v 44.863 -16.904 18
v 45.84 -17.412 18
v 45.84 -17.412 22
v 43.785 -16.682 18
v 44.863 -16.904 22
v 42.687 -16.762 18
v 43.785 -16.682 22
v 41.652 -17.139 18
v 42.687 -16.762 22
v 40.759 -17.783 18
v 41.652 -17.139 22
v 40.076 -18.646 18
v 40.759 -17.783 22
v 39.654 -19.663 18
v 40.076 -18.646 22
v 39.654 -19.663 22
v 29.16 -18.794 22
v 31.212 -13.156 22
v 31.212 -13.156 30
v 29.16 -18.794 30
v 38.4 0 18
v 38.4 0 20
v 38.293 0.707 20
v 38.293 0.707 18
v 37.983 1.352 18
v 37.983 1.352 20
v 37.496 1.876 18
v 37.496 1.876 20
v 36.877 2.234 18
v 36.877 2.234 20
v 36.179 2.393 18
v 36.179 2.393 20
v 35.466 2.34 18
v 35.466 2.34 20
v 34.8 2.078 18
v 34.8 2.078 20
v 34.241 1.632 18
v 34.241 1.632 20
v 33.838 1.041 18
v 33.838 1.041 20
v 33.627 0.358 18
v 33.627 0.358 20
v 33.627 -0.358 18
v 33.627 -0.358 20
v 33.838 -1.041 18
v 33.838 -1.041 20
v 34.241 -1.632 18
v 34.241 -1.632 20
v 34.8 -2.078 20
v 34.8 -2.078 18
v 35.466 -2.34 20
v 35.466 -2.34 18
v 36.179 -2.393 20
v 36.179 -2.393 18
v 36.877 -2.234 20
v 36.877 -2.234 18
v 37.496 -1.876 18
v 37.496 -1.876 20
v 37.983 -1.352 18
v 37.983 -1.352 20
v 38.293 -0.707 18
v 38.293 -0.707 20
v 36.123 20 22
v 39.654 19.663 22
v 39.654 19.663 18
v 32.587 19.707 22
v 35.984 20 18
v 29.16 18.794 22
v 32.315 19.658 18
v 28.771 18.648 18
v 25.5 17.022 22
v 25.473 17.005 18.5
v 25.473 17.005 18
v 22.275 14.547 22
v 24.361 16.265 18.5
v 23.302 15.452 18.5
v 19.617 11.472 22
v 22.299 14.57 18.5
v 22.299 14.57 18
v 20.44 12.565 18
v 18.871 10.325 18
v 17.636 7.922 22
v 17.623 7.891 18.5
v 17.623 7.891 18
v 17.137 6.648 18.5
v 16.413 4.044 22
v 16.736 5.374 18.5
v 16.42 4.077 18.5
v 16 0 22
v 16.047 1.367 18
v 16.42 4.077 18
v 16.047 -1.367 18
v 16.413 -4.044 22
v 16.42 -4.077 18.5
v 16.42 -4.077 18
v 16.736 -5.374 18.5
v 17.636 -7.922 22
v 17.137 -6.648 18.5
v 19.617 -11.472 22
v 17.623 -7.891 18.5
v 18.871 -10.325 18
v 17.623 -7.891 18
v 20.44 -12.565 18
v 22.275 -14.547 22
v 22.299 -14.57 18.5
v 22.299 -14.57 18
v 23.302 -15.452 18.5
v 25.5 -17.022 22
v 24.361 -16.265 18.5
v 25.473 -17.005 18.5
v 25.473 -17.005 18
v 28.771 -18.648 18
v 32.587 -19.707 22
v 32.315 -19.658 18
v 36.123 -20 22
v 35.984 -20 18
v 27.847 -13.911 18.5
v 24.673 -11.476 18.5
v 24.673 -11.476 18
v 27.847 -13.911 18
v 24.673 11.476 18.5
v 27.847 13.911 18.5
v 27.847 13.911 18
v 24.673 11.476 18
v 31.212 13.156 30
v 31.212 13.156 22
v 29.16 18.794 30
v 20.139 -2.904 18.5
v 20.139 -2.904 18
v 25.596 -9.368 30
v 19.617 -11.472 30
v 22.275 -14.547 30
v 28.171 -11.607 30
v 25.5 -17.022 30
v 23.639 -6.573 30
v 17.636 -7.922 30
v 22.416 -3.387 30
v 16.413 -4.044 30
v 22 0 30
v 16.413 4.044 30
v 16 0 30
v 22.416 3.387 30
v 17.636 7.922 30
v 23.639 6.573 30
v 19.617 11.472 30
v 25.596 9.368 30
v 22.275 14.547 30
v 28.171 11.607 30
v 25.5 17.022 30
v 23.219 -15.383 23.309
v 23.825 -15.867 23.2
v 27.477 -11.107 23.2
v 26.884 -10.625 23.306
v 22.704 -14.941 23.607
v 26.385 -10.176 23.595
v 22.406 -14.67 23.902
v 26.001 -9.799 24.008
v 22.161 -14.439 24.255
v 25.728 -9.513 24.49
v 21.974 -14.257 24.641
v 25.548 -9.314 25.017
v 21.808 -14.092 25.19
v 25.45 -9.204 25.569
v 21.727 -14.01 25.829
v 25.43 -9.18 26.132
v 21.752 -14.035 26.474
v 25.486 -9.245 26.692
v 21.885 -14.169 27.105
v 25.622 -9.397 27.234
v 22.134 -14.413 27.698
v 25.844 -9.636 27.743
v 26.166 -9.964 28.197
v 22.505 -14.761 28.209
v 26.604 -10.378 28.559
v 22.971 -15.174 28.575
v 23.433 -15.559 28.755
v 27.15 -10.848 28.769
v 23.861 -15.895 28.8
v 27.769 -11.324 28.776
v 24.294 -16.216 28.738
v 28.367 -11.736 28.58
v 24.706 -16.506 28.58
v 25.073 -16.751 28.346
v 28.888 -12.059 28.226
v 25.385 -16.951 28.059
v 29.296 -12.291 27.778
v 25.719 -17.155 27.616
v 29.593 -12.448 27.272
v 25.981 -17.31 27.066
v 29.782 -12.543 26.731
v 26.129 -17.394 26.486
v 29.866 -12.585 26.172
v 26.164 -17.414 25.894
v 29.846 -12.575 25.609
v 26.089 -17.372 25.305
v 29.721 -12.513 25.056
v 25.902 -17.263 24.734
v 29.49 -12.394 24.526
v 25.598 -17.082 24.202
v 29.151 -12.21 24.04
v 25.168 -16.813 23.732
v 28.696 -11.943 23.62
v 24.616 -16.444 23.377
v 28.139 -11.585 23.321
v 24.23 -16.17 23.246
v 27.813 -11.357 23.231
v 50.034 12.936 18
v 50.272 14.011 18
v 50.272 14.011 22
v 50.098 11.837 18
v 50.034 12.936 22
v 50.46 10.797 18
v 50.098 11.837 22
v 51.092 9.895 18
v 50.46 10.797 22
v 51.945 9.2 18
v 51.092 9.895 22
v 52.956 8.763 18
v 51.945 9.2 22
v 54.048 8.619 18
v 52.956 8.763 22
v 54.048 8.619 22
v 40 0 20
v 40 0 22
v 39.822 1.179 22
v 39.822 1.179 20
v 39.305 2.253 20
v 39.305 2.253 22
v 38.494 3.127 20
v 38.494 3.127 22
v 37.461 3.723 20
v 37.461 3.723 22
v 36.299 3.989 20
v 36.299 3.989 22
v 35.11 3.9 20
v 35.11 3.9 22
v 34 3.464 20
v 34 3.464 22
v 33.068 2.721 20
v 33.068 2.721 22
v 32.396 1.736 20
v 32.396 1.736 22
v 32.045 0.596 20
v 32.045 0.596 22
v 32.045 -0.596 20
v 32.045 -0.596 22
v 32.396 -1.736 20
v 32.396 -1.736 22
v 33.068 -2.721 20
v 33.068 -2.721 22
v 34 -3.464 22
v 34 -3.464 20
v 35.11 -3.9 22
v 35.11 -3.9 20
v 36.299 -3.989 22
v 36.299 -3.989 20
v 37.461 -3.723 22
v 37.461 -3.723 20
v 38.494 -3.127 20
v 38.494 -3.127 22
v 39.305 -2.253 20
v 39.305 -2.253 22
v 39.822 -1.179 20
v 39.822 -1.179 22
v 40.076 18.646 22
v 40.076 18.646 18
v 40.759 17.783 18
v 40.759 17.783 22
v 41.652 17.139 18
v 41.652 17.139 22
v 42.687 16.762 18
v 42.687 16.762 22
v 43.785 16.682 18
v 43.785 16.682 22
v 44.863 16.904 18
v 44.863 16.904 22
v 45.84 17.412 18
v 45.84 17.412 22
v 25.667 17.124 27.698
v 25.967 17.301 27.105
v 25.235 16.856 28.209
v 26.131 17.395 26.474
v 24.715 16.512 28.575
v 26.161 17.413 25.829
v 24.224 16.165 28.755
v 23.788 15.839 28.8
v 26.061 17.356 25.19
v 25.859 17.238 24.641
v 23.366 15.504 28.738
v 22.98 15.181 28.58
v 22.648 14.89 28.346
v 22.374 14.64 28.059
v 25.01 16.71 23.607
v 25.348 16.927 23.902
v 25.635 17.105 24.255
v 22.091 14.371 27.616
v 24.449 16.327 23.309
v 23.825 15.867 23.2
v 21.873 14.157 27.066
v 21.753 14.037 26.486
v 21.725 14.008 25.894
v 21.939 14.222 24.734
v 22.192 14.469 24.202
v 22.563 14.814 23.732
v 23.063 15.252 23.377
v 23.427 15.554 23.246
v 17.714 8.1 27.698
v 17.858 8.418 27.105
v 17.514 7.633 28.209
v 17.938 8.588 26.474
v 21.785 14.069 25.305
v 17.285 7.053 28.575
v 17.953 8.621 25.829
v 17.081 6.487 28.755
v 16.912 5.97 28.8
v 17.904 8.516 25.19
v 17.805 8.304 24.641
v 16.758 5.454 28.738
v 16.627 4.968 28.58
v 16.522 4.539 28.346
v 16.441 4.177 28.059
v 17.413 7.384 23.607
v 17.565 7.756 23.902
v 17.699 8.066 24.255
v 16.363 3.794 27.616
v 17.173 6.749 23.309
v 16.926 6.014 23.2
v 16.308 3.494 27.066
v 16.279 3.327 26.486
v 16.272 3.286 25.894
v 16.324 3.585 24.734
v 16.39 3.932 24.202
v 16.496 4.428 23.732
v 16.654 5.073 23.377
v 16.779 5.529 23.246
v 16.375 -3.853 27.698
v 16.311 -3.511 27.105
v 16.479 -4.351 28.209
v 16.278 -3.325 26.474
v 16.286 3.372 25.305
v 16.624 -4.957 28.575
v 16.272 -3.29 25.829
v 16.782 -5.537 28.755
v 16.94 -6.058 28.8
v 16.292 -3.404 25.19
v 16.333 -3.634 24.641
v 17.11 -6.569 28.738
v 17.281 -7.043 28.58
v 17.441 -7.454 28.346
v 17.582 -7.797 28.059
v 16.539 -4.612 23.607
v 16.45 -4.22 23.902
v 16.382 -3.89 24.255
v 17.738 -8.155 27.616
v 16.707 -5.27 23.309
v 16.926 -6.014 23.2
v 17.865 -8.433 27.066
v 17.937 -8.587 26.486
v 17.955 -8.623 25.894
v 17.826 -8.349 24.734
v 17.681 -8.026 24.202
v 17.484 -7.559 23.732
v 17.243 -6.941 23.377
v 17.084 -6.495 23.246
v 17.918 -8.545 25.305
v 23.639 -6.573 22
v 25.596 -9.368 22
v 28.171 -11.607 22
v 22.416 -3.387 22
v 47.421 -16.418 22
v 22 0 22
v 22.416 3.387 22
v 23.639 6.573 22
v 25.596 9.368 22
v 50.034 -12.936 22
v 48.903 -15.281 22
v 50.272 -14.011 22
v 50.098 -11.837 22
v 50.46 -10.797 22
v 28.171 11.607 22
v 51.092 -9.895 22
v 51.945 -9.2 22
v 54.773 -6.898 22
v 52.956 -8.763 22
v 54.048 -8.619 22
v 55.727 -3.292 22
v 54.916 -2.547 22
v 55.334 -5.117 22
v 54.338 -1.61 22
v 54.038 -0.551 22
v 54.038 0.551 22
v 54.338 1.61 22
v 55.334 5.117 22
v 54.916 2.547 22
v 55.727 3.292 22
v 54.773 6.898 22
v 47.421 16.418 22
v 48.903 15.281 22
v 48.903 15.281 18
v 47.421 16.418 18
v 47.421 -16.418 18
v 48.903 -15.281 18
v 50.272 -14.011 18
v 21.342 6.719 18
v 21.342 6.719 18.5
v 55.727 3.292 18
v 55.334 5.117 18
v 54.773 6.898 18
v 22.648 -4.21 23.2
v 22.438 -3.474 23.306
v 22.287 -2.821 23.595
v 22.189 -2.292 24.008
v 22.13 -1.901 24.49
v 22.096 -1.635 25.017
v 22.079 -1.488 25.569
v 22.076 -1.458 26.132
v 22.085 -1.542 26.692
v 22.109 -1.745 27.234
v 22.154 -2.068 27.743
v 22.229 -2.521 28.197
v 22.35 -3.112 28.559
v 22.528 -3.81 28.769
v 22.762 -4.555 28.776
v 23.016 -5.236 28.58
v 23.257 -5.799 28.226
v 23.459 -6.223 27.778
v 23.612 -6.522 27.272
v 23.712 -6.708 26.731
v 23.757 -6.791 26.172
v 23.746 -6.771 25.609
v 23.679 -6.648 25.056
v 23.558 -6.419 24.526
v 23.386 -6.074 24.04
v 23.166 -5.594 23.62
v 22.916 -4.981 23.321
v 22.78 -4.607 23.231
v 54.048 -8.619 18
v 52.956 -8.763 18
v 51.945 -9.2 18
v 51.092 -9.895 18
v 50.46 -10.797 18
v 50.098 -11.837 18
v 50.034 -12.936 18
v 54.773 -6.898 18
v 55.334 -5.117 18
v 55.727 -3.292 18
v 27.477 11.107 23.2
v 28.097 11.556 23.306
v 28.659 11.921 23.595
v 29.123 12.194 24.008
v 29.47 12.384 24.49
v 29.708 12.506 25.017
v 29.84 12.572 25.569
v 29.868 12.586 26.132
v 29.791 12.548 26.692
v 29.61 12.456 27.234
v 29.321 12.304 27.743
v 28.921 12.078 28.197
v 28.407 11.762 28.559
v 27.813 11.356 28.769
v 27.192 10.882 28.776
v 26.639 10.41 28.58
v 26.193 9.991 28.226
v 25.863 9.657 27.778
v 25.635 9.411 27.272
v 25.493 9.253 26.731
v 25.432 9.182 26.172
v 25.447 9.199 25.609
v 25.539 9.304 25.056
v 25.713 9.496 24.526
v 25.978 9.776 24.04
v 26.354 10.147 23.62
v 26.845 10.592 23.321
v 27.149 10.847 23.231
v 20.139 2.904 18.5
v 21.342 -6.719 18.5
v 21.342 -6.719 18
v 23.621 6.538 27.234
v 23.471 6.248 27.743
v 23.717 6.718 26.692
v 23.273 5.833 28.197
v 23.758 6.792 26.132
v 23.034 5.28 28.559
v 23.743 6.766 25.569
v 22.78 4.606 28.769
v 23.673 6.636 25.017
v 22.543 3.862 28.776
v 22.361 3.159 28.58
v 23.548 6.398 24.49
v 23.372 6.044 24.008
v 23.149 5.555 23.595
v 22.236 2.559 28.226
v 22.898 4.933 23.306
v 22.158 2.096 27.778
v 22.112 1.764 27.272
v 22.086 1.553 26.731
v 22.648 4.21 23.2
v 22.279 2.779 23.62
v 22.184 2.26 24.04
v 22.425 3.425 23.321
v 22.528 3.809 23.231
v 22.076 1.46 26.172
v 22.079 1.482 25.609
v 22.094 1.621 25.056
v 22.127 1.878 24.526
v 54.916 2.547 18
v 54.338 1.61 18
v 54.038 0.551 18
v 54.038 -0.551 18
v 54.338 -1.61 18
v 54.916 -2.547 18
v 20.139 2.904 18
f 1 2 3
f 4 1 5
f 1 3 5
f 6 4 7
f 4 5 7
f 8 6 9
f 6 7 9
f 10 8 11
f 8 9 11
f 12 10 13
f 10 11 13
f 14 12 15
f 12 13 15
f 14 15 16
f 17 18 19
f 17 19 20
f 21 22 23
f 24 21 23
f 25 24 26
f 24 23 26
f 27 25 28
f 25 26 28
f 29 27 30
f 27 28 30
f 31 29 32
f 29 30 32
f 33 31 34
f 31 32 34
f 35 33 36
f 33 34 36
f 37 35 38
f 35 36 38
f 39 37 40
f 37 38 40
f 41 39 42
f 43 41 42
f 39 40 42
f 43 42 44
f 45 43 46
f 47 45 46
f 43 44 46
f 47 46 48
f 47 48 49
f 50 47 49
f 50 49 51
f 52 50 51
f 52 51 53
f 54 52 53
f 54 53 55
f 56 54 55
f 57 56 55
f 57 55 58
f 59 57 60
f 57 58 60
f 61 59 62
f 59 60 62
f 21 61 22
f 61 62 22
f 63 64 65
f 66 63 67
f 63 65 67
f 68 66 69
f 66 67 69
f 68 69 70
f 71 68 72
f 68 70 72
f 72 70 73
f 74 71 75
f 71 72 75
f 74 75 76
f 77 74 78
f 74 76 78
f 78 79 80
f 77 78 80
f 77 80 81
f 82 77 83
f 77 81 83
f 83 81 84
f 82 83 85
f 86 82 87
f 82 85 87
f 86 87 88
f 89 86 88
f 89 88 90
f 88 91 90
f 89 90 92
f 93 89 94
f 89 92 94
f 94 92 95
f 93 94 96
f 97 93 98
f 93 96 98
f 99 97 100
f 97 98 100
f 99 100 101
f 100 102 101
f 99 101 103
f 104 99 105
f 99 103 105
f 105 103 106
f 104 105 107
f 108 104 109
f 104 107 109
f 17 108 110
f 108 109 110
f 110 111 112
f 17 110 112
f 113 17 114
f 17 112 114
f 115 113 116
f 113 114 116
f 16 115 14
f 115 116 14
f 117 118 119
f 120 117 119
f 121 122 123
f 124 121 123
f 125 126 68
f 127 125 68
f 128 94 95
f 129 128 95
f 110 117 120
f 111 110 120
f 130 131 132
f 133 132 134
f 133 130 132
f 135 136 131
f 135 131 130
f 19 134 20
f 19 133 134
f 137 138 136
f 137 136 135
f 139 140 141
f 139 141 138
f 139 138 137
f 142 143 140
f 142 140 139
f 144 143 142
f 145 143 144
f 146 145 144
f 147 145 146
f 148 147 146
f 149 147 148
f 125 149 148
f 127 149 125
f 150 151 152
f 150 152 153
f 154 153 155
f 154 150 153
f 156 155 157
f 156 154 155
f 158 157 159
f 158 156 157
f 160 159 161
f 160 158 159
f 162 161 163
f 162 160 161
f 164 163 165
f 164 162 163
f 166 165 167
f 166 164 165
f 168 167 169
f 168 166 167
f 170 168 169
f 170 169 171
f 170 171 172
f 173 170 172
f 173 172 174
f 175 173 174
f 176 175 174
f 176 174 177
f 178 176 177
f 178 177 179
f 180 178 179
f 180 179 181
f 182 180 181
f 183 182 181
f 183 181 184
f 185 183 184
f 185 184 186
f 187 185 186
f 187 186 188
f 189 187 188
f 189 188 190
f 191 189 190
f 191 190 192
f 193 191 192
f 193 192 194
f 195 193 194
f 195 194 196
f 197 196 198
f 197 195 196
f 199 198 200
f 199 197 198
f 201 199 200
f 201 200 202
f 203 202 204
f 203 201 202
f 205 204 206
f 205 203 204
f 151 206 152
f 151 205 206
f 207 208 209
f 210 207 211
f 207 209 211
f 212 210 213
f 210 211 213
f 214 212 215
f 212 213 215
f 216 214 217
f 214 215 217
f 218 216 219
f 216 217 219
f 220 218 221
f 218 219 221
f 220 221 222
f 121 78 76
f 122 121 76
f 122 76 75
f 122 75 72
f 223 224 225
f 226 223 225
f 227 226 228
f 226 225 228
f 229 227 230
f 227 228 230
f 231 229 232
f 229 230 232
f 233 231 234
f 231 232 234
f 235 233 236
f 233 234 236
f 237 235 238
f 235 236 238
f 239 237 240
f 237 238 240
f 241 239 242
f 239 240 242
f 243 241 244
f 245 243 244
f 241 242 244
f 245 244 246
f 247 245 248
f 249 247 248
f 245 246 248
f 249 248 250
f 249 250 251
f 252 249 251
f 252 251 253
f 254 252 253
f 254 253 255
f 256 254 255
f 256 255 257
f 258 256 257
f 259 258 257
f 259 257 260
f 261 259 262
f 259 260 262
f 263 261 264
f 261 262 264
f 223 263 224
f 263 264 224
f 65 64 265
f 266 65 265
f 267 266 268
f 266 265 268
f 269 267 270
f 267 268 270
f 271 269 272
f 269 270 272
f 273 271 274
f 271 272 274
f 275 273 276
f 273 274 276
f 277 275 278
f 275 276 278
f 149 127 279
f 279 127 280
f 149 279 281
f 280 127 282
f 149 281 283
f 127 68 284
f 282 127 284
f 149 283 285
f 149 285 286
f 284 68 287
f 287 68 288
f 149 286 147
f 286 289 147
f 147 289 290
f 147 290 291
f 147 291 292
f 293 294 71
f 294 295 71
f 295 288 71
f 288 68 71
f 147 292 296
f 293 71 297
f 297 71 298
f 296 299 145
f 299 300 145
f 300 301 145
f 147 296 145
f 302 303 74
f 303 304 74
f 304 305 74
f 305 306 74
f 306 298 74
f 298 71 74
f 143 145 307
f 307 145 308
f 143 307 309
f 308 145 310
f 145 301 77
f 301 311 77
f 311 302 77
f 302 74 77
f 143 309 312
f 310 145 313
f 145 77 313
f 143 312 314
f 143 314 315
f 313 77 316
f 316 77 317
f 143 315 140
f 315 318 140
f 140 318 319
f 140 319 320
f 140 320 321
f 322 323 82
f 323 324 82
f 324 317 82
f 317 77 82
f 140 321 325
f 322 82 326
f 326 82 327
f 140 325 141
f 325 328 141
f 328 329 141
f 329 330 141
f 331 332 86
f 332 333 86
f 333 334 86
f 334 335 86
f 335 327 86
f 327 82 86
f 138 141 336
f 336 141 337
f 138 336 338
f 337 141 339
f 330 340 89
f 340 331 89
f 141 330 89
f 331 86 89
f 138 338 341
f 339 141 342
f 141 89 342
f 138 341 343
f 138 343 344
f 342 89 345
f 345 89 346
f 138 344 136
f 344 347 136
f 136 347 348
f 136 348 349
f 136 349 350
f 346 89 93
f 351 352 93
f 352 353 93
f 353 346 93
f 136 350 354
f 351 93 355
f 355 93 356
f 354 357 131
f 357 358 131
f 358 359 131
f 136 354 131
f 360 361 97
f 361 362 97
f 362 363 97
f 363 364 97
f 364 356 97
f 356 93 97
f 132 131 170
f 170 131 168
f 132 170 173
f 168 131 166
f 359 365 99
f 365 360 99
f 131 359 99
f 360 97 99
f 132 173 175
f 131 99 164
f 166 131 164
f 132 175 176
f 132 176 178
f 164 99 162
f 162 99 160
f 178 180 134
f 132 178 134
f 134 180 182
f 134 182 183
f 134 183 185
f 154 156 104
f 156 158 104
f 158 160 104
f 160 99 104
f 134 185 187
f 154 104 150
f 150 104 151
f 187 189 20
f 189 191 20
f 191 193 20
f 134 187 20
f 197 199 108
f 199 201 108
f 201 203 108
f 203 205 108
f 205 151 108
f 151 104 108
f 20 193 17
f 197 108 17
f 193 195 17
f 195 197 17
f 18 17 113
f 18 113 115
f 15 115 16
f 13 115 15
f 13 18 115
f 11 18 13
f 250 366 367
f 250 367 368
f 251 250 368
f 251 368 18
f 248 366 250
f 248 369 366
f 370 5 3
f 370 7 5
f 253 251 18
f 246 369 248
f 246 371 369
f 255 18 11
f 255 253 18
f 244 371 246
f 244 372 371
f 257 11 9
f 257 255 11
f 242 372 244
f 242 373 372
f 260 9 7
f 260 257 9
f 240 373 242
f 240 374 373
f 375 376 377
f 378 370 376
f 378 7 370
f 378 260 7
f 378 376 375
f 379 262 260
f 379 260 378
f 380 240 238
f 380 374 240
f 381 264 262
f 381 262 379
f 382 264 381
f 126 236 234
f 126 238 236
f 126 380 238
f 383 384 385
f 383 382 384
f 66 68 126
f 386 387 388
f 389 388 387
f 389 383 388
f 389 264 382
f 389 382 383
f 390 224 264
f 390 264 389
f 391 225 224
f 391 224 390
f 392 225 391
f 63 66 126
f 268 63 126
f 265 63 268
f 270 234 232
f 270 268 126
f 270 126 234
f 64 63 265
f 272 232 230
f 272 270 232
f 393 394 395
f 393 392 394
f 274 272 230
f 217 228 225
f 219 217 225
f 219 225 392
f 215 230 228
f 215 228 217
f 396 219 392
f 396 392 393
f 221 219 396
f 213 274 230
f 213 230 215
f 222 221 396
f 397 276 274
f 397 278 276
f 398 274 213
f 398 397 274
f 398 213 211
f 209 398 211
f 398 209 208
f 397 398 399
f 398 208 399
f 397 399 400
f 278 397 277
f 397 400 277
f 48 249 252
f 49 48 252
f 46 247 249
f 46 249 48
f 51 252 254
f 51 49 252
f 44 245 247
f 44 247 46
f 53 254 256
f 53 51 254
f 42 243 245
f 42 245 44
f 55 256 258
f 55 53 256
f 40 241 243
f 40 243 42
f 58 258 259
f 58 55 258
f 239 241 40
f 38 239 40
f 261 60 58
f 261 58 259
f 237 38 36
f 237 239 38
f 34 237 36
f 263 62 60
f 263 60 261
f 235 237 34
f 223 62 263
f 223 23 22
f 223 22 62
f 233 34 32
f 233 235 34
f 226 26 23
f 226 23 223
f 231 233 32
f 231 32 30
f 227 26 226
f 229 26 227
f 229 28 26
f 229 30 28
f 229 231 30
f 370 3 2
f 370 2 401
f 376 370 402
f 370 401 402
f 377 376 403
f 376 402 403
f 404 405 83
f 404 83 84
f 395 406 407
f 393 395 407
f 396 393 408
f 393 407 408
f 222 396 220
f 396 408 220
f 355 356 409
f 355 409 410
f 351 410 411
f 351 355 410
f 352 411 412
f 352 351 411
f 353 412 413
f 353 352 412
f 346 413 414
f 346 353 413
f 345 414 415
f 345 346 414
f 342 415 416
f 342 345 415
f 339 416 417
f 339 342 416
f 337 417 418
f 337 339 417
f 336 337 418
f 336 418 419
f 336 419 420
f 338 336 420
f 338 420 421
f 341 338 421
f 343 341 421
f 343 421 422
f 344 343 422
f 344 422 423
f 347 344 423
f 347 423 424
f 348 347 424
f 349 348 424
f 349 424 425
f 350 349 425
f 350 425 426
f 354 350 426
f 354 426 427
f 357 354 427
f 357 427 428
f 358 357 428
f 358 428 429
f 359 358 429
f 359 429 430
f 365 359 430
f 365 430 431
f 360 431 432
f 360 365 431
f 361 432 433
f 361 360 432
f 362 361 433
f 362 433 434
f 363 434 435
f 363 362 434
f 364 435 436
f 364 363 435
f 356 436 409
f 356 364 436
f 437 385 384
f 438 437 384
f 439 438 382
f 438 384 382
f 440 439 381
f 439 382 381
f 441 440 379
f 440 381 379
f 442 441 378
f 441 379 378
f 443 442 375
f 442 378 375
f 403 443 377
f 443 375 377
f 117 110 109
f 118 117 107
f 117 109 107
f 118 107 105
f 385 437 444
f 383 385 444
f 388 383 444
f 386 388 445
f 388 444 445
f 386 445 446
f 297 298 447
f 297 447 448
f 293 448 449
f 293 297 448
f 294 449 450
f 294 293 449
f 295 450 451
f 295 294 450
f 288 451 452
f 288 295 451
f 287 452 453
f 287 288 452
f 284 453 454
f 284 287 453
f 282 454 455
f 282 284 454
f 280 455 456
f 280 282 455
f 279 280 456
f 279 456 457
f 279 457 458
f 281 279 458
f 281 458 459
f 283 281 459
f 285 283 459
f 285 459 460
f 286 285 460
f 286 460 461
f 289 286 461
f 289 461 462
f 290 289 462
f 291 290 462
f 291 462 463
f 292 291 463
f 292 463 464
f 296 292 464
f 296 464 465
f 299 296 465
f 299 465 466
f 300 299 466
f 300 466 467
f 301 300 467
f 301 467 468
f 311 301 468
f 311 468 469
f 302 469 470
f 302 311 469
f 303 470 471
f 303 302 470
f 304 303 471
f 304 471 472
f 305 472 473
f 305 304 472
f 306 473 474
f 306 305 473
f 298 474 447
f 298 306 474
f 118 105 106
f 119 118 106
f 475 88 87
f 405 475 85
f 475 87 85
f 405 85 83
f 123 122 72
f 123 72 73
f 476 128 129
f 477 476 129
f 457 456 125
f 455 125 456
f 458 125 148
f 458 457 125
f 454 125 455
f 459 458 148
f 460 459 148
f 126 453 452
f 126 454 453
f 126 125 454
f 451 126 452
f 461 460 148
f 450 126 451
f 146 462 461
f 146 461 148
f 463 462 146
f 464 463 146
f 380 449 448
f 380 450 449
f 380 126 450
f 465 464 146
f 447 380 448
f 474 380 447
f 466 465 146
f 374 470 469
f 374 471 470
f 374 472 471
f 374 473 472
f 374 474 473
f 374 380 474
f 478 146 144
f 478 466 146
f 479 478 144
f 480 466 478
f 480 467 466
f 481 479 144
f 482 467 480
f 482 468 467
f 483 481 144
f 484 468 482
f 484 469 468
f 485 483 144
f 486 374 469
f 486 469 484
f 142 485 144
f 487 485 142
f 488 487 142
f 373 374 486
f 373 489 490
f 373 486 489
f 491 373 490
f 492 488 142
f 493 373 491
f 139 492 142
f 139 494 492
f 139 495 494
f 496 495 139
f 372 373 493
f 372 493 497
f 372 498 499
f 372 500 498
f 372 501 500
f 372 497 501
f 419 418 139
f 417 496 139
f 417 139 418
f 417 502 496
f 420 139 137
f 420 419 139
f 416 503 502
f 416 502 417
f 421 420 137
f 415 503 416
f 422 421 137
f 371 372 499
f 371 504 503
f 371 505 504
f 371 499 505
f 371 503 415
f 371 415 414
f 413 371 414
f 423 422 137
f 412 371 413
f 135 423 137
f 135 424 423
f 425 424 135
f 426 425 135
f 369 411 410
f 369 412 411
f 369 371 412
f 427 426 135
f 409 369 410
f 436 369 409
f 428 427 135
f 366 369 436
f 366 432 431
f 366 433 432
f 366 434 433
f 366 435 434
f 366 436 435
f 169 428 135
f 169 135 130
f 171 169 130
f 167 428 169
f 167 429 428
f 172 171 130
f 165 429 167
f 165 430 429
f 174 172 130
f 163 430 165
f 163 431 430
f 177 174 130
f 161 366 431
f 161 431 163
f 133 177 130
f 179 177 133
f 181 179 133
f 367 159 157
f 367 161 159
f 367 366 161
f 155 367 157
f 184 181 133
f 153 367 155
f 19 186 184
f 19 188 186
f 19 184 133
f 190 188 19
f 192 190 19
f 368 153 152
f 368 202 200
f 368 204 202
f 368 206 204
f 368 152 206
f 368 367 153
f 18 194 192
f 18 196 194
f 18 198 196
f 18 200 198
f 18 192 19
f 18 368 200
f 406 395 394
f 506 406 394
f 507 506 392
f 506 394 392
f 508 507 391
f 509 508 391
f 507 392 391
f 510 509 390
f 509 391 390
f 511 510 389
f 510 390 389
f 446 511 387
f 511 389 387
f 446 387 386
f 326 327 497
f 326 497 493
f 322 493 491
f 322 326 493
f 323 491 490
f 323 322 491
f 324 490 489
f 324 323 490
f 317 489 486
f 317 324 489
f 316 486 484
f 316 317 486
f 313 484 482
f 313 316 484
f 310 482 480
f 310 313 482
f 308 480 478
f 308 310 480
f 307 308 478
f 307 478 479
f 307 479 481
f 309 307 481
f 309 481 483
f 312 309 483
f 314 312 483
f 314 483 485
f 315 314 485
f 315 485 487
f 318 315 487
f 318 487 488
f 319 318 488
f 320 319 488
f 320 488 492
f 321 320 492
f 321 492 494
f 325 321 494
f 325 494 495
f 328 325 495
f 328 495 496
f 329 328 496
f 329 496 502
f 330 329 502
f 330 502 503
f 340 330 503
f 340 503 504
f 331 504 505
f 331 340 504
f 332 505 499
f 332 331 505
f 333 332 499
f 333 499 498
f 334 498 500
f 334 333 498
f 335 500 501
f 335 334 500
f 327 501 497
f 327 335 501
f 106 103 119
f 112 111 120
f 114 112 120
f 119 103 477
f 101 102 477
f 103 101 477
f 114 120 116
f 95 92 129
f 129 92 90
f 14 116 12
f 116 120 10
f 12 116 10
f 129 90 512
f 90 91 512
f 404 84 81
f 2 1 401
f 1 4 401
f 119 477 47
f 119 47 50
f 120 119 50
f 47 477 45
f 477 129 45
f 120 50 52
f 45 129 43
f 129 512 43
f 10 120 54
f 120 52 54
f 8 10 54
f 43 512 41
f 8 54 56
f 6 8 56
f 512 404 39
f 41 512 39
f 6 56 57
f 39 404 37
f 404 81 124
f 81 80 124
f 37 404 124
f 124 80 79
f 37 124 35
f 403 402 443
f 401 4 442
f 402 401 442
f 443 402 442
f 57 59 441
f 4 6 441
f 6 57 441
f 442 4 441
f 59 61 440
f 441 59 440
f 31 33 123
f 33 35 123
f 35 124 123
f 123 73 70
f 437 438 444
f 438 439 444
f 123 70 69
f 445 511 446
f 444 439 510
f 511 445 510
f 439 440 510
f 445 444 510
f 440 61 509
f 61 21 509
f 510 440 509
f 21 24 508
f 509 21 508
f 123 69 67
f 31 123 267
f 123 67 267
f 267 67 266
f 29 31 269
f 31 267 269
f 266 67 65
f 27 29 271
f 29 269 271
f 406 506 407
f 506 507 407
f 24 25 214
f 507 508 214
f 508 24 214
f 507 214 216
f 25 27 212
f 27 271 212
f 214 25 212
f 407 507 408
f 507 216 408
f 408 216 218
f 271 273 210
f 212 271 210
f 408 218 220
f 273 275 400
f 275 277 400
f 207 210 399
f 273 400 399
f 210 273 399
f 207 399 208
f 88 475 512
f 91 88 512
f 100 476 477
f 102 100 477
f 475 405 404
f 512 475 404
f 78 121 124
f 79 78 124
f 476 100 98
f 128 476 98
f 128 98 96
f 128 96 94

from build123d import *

# Parameters (mm, degrees)
BOX003_W                    = 4
BOX003_H                    = 4
BOX003_DEPTH                = 5
BOX003_PITCH_ANGLE          = 90
BOX003_PLACEMENT_ANGLE      = 17.5
BOX004_W                    = 4
BOX004_H                    = 4
BOX004_DEPTH                = 5
BOX004_PITCH_ANGLE          = 90
BOX004_PLACEMENT_ANGLE      = -17.5
BOX005_W                    = 4
BOX005_H                    = 4
BOX005_DEPTH                = 5
BOX005_PITCH_ANGLE          = 90
BOX005_PLACEMENT_ANGLE      = -52.5
BOX006_W                    = 4
BOX006_H                    = 4
BOX006_DEPTH                = 5
BOX006_PITCH_ANGLE          = 90
BOX006_PLACEMENT_ANGLE      = 52.5
CYLINDER004_R               = 2.8
CYLINDER004_DEPTH           = 10
CYLINDER004_PITCH_ANGLE     = 90
CYLINDER004_PLACEMENT_ANGLE = 17.5
CYLINDER005_R               = 2.8
CYLINDER005_DEPTH           = 10
CYLINDER005_PITCH_ANGLE     = 90
CYLINDER005_PLACEMENT_ANGLE = -17.5
CYLINDER006_R               = 2.8
CYLINDER006_DEPTH           = 10
CYLINDER006_PITCH_ANGLE     = 90
CYLINDER006_PLACEMENT_ANGLE = -52.5
CYLINDER007_R               = 2.8
CYLINDER007_DEPTH           = 10
CYLINDER007_PITCH_ANGLE     = 90
CYLINDER007_PLACEMENT_ANGLE = 52.5
SKETCH010_R                 = 20
PAD004_DEPTH                = 4
PAD005_DEPTH                = 8
SKETCH012_R                 = 4
POCKET006_DEPTH             = 2
SKETCH013_R                 = 2.4
POCKET007_DEPTH             = 2
SKETCH050_R                 = 4
POCKET023_DEPTH             = 5


with BuildPart() as box003:
    # Box003 → Box003 (new body)
    with BuildSketch(Plane.XY):
        with Locations((2, 2)):
            Rectangle(BOX003_W, BOX003_H)
    extrude(amount=BOX003_DEPTH)


with BuildPart() as box003_1:
    # Box003 pitch: moved
    add(box003.part.rotate(Axis((0, 0, 0), (0, 1, 0)), BOX003_PITCH_ANGLE))


with BuildPart() as box003_2:
    # Box003 placement: moved
    add(box003_1.part.moved(Location((16.5733556333, -8.2222556911, 18.5))).rotate(Axis((16.5733556333, -8.2222556911, 18.5), (0, 0, 1)), BOX003_PLACEMENT_ANGLE))


with BuildPart() as box004:
    # Box004 → Box004 (new body)
    with BuildSketch(Plane.XY):
        with Locations((2, 2)):
            Rectangle(BOX004_W, BOX004_H)
    extrude(amount=BOX004_DEPTH)


with BuildPart() as box004_1:
    # Box004 pitch: moved
    add(box004.part.rotate(Axis((0, 0, 0), (0, 1, 0)), BOX004_PITCH_ANGLE))


with BuildPart() as box004_2:
    # Box004 placement: moved
    add(box004_1.part.moved(Location((15.3705324353, 4.4073878881, 18.5))).rotate(Axis((15.3705324353, 4.4073878881, 18.5), (0, 0, 1)), BOX004_PLACEMENT_ANGLE))


with BuildPart() as box005:
    # Box005 → Box005 (new body)
    with BuildSketch(Plane.XY):
        with Locations((2, 2)):
            Rectangle(BOX005_W, BOX005_H)
    extrude(amount=BOX005_DEPTH)


with BuildPart() as box005_1:
    # Box005 pitch: moved
    add(box005.part.rotate(Axis((0, 0, 0), (0, 1, 0)), BOX005_PITCH_ANGLE))


with BuildPart() as box005_2:
    # Box005 placement: moved
    add(box005_1.part.moved(Location((21.6293033102, 15.4428972881, 18.5))).rotate(Axis((21.6293033102, 15.4428972881, 18.5), (0, 0, 1)), BOX005_PLACEMENT_ANGLE))


with BuildPart() as fusion:
    # Box006 → Box006 (new body)
    with BuildSketch(Plane.XY):
        with Locations((2, 2)):
            Rectangle(BOX006_W, BOX006_H)
    extrude(amount=BOX006_DEPTH)


with BuildPart() as fusion_1:
    # Box006 pitch: moved
    add(fusion.part.rotate(Axis((0, 0, 0), (0, 1, 0)), BOX006_PITCH_ANGLE))


with BuildPart() as fusion_2:
    # Box006 placement: moved
    add(fusion_1.part.moved(Location((24.8027166714, -17.8779430041, 18.5))).rotate(Axis((24.8027166714, -17.8779430041, 18.5), (0, 0, 1)), BOX006_PLACEMENT_ANGLE))

    # Fusion: union Box003, Box004, Box005
    add(box003_2.part)
    add(box004_2.part)
    add(box005_2.part)


with BuildPart() as cylinder004:
    # Cylinder004 → Cylinder004 (new body)
    with BuildSketch(Plane.XY):
        Circle(CYLINDER004_R)
    extrude(amount=CYLINDER004_DEPTH)


with BuildPart() as cylinder004_1:
    # Cylinder004 pitch: moved
    add(cylinder004.part.rotate(Axis((0, 0, 0), (0, 1, 0)), CYLINDER004_PITCH_ANGLE))


with BuildPart() as cylinder004_2:
    # Cylinder004 placement: moved
    add(cylinder004_1.part.moved(Location((15.9719440343, -6.3148217896, 26))).rotate(Axis((15.9719440343, -6.3148217896, 26), (0, 0, 1)), CYLINDER004_PLACEMENT_ANGLE))


with BuildPart() as cylinder005:
    # Cylinder005 → Cylinder005 (new body)
    with BuildSketch(Plane.XY):
        Circle(CYLINDER005_R)
    extrude(amount=CYLINDER005_DEPTH)


with BuildPart() as cylinder005_1:
    # Cylinder005 pitch: moved
    add(cylinder005.part.rotate(Axis((0, 0, 0), (0, 1, 0)), CYLINDER005_PITCH_ANGLE))


with BuildPart() as cylinder005_2:
    # Cylinder005 placement: moved
    add(cylinder005_1.part.moved(Location((15.9719440343, 6.3148217896, 26))).rotate(Axis((15.9719440343, 6.3148217896, 26), (0, 0, 1)), CYLINDER005_PLACEMENT_ANGLE))


with BuildPart() as cylinder006:
    # Cylinder006 → Cylinder006 (new body)
    with BuildSketch(Plane.XY):
        Circle(CYLINDER006_R)
    extrude(amount=CYLINDER006_DEPTH)


with BuildPart() as cylinder006_1:
    # Cylinder006 pitch: moved
    add(cylinder006.part.rotate(Axis((0, 0, 0), (0, 1, 0)), CYLINDER006_PITCH_ANGLE))


with BuildPart() as cylinder006_2:
    # Cylinder006 placement: moved
    add(cylinder006_1.part.moved(Location((23.2160099908, 16.6604201461, 26))).rotate(Axis((23.2160099908, 16.6604201461, 26), (0, 0, 1)), CYLINDER006_PLACEMENT_ANGLE))


with BuildPart() as fusion002:
    # Cylinder007 → Cylinder007 (new body)
    with BuildSketch(Plane.XY):
        Circle(CYLINDER007_R)
    extrude(amount=CYLINDER007_DEPTH)


with BuildPart() as fusion002_1:
    # Cylinder007 pitch: moved
    add(fusion002.part.rotate(Axis((0, 0, 0), (0, 1, 0)), CYLINDER007_PITCH_ANGLE))


with BuildPart() as fusion002_2:
    # Cylinder007 placement: moved
    add(fusion002_1.part.moved(Location((23.2160099908, -16.6604201461, 26))).rotate(Axis((23.2160099908, -16.6604201461, 26), (0, 0, 1)), CYLINDER007_PLACEMENT_ANGLE))

    # Fusion001: union Cylinder004, Cylinder005, Cylinder006
    add(cylinder004_2.part)
    add(cylinder005_2.part)
    add(cylinder006_2.part)


with BuildPart() as cut001:
    # Sketch010 (on Face1 of CopyPocket005) → Pad004 (new body)
    with BuildSketch(Plane.XY.offset(18)):
        with Locations((36, 0)):
            Circle(SKETCH010_R)
    extrude(amount=PAD004_DEPTH)

    # Sketch011 (on Face3 of Pad004) → Pad005 (join)
    with BuildSketch(Plane.XY.offset(22)):
        with BuildLine():
            ThreePointArc((29.1595971335, 18.7938524157), (16, 0), (29.1595971335, -18.7938524157))
            Line((31.2117179934, -13.155696691), (29.1595971335, -18.7938524157))
            ThreePointArc((31.2117179934, 13.155696691), (22, 0), (31.2117179934, -13.155696691))
            Line((31.2117179934, 13.155696691), (29.1595971335, 18.7938524157))
        make_face()
    extrude(amount=PAD005_DEPTH)

    # Sketch012 (on Face3 of Pad005) → Pocket006 (cut)
    with BuildSketch(Plane.XY.offset(22)):
        with Locations((36, 0)):
            Circle(SKETCH012_R)
    extrude(amount=-POCKET006_DEPTH, mode=Mode.SUBTRACT)

    # Sketch013 (on Face10 of Pocket006) → Pocket007 (cut)
    with BuildSketch(Plane.XY.offset(20)):
        with Locations((36, 0)):
            Circle(SKETCH013_R)
    extrude(amount=-POCKET007_DEPTH, mode=Mode.SUBTRACT)

    # Sketch050 (on Face4 of Pocket007) → Pocket023 (cut)
    with BuildSketch(Plane.XY.offset(22)):
        with Locations((43.5244431532, 20.6732376573)):
            Circle(SKETCH050_R)
        with Locations((54.0213449744, 12.6186815997)):
            Circle(SKETCH050_R)
        with Locations((58, 0)):
            Circle(SKETCH050_R)
        with Locations((54.0213449744, -12.6186815997)):
            Circle(SKETCH050_R)
        with Locations((43.5244431532, -20.6732376573)):
            Circle(SKETCH050_R)
    extrude(amount=-POCKET023_DEPTH, mode=Mode.SUBTRACT)

    # Cut: cut Fusion002
    add(fusion002_2.part, mode=Mode.SUBTRACT)

    # Cut001: cut Fusion
    add(fusion_2.part, mode=Mode.SUBTRACT)


solid = cut001.part
